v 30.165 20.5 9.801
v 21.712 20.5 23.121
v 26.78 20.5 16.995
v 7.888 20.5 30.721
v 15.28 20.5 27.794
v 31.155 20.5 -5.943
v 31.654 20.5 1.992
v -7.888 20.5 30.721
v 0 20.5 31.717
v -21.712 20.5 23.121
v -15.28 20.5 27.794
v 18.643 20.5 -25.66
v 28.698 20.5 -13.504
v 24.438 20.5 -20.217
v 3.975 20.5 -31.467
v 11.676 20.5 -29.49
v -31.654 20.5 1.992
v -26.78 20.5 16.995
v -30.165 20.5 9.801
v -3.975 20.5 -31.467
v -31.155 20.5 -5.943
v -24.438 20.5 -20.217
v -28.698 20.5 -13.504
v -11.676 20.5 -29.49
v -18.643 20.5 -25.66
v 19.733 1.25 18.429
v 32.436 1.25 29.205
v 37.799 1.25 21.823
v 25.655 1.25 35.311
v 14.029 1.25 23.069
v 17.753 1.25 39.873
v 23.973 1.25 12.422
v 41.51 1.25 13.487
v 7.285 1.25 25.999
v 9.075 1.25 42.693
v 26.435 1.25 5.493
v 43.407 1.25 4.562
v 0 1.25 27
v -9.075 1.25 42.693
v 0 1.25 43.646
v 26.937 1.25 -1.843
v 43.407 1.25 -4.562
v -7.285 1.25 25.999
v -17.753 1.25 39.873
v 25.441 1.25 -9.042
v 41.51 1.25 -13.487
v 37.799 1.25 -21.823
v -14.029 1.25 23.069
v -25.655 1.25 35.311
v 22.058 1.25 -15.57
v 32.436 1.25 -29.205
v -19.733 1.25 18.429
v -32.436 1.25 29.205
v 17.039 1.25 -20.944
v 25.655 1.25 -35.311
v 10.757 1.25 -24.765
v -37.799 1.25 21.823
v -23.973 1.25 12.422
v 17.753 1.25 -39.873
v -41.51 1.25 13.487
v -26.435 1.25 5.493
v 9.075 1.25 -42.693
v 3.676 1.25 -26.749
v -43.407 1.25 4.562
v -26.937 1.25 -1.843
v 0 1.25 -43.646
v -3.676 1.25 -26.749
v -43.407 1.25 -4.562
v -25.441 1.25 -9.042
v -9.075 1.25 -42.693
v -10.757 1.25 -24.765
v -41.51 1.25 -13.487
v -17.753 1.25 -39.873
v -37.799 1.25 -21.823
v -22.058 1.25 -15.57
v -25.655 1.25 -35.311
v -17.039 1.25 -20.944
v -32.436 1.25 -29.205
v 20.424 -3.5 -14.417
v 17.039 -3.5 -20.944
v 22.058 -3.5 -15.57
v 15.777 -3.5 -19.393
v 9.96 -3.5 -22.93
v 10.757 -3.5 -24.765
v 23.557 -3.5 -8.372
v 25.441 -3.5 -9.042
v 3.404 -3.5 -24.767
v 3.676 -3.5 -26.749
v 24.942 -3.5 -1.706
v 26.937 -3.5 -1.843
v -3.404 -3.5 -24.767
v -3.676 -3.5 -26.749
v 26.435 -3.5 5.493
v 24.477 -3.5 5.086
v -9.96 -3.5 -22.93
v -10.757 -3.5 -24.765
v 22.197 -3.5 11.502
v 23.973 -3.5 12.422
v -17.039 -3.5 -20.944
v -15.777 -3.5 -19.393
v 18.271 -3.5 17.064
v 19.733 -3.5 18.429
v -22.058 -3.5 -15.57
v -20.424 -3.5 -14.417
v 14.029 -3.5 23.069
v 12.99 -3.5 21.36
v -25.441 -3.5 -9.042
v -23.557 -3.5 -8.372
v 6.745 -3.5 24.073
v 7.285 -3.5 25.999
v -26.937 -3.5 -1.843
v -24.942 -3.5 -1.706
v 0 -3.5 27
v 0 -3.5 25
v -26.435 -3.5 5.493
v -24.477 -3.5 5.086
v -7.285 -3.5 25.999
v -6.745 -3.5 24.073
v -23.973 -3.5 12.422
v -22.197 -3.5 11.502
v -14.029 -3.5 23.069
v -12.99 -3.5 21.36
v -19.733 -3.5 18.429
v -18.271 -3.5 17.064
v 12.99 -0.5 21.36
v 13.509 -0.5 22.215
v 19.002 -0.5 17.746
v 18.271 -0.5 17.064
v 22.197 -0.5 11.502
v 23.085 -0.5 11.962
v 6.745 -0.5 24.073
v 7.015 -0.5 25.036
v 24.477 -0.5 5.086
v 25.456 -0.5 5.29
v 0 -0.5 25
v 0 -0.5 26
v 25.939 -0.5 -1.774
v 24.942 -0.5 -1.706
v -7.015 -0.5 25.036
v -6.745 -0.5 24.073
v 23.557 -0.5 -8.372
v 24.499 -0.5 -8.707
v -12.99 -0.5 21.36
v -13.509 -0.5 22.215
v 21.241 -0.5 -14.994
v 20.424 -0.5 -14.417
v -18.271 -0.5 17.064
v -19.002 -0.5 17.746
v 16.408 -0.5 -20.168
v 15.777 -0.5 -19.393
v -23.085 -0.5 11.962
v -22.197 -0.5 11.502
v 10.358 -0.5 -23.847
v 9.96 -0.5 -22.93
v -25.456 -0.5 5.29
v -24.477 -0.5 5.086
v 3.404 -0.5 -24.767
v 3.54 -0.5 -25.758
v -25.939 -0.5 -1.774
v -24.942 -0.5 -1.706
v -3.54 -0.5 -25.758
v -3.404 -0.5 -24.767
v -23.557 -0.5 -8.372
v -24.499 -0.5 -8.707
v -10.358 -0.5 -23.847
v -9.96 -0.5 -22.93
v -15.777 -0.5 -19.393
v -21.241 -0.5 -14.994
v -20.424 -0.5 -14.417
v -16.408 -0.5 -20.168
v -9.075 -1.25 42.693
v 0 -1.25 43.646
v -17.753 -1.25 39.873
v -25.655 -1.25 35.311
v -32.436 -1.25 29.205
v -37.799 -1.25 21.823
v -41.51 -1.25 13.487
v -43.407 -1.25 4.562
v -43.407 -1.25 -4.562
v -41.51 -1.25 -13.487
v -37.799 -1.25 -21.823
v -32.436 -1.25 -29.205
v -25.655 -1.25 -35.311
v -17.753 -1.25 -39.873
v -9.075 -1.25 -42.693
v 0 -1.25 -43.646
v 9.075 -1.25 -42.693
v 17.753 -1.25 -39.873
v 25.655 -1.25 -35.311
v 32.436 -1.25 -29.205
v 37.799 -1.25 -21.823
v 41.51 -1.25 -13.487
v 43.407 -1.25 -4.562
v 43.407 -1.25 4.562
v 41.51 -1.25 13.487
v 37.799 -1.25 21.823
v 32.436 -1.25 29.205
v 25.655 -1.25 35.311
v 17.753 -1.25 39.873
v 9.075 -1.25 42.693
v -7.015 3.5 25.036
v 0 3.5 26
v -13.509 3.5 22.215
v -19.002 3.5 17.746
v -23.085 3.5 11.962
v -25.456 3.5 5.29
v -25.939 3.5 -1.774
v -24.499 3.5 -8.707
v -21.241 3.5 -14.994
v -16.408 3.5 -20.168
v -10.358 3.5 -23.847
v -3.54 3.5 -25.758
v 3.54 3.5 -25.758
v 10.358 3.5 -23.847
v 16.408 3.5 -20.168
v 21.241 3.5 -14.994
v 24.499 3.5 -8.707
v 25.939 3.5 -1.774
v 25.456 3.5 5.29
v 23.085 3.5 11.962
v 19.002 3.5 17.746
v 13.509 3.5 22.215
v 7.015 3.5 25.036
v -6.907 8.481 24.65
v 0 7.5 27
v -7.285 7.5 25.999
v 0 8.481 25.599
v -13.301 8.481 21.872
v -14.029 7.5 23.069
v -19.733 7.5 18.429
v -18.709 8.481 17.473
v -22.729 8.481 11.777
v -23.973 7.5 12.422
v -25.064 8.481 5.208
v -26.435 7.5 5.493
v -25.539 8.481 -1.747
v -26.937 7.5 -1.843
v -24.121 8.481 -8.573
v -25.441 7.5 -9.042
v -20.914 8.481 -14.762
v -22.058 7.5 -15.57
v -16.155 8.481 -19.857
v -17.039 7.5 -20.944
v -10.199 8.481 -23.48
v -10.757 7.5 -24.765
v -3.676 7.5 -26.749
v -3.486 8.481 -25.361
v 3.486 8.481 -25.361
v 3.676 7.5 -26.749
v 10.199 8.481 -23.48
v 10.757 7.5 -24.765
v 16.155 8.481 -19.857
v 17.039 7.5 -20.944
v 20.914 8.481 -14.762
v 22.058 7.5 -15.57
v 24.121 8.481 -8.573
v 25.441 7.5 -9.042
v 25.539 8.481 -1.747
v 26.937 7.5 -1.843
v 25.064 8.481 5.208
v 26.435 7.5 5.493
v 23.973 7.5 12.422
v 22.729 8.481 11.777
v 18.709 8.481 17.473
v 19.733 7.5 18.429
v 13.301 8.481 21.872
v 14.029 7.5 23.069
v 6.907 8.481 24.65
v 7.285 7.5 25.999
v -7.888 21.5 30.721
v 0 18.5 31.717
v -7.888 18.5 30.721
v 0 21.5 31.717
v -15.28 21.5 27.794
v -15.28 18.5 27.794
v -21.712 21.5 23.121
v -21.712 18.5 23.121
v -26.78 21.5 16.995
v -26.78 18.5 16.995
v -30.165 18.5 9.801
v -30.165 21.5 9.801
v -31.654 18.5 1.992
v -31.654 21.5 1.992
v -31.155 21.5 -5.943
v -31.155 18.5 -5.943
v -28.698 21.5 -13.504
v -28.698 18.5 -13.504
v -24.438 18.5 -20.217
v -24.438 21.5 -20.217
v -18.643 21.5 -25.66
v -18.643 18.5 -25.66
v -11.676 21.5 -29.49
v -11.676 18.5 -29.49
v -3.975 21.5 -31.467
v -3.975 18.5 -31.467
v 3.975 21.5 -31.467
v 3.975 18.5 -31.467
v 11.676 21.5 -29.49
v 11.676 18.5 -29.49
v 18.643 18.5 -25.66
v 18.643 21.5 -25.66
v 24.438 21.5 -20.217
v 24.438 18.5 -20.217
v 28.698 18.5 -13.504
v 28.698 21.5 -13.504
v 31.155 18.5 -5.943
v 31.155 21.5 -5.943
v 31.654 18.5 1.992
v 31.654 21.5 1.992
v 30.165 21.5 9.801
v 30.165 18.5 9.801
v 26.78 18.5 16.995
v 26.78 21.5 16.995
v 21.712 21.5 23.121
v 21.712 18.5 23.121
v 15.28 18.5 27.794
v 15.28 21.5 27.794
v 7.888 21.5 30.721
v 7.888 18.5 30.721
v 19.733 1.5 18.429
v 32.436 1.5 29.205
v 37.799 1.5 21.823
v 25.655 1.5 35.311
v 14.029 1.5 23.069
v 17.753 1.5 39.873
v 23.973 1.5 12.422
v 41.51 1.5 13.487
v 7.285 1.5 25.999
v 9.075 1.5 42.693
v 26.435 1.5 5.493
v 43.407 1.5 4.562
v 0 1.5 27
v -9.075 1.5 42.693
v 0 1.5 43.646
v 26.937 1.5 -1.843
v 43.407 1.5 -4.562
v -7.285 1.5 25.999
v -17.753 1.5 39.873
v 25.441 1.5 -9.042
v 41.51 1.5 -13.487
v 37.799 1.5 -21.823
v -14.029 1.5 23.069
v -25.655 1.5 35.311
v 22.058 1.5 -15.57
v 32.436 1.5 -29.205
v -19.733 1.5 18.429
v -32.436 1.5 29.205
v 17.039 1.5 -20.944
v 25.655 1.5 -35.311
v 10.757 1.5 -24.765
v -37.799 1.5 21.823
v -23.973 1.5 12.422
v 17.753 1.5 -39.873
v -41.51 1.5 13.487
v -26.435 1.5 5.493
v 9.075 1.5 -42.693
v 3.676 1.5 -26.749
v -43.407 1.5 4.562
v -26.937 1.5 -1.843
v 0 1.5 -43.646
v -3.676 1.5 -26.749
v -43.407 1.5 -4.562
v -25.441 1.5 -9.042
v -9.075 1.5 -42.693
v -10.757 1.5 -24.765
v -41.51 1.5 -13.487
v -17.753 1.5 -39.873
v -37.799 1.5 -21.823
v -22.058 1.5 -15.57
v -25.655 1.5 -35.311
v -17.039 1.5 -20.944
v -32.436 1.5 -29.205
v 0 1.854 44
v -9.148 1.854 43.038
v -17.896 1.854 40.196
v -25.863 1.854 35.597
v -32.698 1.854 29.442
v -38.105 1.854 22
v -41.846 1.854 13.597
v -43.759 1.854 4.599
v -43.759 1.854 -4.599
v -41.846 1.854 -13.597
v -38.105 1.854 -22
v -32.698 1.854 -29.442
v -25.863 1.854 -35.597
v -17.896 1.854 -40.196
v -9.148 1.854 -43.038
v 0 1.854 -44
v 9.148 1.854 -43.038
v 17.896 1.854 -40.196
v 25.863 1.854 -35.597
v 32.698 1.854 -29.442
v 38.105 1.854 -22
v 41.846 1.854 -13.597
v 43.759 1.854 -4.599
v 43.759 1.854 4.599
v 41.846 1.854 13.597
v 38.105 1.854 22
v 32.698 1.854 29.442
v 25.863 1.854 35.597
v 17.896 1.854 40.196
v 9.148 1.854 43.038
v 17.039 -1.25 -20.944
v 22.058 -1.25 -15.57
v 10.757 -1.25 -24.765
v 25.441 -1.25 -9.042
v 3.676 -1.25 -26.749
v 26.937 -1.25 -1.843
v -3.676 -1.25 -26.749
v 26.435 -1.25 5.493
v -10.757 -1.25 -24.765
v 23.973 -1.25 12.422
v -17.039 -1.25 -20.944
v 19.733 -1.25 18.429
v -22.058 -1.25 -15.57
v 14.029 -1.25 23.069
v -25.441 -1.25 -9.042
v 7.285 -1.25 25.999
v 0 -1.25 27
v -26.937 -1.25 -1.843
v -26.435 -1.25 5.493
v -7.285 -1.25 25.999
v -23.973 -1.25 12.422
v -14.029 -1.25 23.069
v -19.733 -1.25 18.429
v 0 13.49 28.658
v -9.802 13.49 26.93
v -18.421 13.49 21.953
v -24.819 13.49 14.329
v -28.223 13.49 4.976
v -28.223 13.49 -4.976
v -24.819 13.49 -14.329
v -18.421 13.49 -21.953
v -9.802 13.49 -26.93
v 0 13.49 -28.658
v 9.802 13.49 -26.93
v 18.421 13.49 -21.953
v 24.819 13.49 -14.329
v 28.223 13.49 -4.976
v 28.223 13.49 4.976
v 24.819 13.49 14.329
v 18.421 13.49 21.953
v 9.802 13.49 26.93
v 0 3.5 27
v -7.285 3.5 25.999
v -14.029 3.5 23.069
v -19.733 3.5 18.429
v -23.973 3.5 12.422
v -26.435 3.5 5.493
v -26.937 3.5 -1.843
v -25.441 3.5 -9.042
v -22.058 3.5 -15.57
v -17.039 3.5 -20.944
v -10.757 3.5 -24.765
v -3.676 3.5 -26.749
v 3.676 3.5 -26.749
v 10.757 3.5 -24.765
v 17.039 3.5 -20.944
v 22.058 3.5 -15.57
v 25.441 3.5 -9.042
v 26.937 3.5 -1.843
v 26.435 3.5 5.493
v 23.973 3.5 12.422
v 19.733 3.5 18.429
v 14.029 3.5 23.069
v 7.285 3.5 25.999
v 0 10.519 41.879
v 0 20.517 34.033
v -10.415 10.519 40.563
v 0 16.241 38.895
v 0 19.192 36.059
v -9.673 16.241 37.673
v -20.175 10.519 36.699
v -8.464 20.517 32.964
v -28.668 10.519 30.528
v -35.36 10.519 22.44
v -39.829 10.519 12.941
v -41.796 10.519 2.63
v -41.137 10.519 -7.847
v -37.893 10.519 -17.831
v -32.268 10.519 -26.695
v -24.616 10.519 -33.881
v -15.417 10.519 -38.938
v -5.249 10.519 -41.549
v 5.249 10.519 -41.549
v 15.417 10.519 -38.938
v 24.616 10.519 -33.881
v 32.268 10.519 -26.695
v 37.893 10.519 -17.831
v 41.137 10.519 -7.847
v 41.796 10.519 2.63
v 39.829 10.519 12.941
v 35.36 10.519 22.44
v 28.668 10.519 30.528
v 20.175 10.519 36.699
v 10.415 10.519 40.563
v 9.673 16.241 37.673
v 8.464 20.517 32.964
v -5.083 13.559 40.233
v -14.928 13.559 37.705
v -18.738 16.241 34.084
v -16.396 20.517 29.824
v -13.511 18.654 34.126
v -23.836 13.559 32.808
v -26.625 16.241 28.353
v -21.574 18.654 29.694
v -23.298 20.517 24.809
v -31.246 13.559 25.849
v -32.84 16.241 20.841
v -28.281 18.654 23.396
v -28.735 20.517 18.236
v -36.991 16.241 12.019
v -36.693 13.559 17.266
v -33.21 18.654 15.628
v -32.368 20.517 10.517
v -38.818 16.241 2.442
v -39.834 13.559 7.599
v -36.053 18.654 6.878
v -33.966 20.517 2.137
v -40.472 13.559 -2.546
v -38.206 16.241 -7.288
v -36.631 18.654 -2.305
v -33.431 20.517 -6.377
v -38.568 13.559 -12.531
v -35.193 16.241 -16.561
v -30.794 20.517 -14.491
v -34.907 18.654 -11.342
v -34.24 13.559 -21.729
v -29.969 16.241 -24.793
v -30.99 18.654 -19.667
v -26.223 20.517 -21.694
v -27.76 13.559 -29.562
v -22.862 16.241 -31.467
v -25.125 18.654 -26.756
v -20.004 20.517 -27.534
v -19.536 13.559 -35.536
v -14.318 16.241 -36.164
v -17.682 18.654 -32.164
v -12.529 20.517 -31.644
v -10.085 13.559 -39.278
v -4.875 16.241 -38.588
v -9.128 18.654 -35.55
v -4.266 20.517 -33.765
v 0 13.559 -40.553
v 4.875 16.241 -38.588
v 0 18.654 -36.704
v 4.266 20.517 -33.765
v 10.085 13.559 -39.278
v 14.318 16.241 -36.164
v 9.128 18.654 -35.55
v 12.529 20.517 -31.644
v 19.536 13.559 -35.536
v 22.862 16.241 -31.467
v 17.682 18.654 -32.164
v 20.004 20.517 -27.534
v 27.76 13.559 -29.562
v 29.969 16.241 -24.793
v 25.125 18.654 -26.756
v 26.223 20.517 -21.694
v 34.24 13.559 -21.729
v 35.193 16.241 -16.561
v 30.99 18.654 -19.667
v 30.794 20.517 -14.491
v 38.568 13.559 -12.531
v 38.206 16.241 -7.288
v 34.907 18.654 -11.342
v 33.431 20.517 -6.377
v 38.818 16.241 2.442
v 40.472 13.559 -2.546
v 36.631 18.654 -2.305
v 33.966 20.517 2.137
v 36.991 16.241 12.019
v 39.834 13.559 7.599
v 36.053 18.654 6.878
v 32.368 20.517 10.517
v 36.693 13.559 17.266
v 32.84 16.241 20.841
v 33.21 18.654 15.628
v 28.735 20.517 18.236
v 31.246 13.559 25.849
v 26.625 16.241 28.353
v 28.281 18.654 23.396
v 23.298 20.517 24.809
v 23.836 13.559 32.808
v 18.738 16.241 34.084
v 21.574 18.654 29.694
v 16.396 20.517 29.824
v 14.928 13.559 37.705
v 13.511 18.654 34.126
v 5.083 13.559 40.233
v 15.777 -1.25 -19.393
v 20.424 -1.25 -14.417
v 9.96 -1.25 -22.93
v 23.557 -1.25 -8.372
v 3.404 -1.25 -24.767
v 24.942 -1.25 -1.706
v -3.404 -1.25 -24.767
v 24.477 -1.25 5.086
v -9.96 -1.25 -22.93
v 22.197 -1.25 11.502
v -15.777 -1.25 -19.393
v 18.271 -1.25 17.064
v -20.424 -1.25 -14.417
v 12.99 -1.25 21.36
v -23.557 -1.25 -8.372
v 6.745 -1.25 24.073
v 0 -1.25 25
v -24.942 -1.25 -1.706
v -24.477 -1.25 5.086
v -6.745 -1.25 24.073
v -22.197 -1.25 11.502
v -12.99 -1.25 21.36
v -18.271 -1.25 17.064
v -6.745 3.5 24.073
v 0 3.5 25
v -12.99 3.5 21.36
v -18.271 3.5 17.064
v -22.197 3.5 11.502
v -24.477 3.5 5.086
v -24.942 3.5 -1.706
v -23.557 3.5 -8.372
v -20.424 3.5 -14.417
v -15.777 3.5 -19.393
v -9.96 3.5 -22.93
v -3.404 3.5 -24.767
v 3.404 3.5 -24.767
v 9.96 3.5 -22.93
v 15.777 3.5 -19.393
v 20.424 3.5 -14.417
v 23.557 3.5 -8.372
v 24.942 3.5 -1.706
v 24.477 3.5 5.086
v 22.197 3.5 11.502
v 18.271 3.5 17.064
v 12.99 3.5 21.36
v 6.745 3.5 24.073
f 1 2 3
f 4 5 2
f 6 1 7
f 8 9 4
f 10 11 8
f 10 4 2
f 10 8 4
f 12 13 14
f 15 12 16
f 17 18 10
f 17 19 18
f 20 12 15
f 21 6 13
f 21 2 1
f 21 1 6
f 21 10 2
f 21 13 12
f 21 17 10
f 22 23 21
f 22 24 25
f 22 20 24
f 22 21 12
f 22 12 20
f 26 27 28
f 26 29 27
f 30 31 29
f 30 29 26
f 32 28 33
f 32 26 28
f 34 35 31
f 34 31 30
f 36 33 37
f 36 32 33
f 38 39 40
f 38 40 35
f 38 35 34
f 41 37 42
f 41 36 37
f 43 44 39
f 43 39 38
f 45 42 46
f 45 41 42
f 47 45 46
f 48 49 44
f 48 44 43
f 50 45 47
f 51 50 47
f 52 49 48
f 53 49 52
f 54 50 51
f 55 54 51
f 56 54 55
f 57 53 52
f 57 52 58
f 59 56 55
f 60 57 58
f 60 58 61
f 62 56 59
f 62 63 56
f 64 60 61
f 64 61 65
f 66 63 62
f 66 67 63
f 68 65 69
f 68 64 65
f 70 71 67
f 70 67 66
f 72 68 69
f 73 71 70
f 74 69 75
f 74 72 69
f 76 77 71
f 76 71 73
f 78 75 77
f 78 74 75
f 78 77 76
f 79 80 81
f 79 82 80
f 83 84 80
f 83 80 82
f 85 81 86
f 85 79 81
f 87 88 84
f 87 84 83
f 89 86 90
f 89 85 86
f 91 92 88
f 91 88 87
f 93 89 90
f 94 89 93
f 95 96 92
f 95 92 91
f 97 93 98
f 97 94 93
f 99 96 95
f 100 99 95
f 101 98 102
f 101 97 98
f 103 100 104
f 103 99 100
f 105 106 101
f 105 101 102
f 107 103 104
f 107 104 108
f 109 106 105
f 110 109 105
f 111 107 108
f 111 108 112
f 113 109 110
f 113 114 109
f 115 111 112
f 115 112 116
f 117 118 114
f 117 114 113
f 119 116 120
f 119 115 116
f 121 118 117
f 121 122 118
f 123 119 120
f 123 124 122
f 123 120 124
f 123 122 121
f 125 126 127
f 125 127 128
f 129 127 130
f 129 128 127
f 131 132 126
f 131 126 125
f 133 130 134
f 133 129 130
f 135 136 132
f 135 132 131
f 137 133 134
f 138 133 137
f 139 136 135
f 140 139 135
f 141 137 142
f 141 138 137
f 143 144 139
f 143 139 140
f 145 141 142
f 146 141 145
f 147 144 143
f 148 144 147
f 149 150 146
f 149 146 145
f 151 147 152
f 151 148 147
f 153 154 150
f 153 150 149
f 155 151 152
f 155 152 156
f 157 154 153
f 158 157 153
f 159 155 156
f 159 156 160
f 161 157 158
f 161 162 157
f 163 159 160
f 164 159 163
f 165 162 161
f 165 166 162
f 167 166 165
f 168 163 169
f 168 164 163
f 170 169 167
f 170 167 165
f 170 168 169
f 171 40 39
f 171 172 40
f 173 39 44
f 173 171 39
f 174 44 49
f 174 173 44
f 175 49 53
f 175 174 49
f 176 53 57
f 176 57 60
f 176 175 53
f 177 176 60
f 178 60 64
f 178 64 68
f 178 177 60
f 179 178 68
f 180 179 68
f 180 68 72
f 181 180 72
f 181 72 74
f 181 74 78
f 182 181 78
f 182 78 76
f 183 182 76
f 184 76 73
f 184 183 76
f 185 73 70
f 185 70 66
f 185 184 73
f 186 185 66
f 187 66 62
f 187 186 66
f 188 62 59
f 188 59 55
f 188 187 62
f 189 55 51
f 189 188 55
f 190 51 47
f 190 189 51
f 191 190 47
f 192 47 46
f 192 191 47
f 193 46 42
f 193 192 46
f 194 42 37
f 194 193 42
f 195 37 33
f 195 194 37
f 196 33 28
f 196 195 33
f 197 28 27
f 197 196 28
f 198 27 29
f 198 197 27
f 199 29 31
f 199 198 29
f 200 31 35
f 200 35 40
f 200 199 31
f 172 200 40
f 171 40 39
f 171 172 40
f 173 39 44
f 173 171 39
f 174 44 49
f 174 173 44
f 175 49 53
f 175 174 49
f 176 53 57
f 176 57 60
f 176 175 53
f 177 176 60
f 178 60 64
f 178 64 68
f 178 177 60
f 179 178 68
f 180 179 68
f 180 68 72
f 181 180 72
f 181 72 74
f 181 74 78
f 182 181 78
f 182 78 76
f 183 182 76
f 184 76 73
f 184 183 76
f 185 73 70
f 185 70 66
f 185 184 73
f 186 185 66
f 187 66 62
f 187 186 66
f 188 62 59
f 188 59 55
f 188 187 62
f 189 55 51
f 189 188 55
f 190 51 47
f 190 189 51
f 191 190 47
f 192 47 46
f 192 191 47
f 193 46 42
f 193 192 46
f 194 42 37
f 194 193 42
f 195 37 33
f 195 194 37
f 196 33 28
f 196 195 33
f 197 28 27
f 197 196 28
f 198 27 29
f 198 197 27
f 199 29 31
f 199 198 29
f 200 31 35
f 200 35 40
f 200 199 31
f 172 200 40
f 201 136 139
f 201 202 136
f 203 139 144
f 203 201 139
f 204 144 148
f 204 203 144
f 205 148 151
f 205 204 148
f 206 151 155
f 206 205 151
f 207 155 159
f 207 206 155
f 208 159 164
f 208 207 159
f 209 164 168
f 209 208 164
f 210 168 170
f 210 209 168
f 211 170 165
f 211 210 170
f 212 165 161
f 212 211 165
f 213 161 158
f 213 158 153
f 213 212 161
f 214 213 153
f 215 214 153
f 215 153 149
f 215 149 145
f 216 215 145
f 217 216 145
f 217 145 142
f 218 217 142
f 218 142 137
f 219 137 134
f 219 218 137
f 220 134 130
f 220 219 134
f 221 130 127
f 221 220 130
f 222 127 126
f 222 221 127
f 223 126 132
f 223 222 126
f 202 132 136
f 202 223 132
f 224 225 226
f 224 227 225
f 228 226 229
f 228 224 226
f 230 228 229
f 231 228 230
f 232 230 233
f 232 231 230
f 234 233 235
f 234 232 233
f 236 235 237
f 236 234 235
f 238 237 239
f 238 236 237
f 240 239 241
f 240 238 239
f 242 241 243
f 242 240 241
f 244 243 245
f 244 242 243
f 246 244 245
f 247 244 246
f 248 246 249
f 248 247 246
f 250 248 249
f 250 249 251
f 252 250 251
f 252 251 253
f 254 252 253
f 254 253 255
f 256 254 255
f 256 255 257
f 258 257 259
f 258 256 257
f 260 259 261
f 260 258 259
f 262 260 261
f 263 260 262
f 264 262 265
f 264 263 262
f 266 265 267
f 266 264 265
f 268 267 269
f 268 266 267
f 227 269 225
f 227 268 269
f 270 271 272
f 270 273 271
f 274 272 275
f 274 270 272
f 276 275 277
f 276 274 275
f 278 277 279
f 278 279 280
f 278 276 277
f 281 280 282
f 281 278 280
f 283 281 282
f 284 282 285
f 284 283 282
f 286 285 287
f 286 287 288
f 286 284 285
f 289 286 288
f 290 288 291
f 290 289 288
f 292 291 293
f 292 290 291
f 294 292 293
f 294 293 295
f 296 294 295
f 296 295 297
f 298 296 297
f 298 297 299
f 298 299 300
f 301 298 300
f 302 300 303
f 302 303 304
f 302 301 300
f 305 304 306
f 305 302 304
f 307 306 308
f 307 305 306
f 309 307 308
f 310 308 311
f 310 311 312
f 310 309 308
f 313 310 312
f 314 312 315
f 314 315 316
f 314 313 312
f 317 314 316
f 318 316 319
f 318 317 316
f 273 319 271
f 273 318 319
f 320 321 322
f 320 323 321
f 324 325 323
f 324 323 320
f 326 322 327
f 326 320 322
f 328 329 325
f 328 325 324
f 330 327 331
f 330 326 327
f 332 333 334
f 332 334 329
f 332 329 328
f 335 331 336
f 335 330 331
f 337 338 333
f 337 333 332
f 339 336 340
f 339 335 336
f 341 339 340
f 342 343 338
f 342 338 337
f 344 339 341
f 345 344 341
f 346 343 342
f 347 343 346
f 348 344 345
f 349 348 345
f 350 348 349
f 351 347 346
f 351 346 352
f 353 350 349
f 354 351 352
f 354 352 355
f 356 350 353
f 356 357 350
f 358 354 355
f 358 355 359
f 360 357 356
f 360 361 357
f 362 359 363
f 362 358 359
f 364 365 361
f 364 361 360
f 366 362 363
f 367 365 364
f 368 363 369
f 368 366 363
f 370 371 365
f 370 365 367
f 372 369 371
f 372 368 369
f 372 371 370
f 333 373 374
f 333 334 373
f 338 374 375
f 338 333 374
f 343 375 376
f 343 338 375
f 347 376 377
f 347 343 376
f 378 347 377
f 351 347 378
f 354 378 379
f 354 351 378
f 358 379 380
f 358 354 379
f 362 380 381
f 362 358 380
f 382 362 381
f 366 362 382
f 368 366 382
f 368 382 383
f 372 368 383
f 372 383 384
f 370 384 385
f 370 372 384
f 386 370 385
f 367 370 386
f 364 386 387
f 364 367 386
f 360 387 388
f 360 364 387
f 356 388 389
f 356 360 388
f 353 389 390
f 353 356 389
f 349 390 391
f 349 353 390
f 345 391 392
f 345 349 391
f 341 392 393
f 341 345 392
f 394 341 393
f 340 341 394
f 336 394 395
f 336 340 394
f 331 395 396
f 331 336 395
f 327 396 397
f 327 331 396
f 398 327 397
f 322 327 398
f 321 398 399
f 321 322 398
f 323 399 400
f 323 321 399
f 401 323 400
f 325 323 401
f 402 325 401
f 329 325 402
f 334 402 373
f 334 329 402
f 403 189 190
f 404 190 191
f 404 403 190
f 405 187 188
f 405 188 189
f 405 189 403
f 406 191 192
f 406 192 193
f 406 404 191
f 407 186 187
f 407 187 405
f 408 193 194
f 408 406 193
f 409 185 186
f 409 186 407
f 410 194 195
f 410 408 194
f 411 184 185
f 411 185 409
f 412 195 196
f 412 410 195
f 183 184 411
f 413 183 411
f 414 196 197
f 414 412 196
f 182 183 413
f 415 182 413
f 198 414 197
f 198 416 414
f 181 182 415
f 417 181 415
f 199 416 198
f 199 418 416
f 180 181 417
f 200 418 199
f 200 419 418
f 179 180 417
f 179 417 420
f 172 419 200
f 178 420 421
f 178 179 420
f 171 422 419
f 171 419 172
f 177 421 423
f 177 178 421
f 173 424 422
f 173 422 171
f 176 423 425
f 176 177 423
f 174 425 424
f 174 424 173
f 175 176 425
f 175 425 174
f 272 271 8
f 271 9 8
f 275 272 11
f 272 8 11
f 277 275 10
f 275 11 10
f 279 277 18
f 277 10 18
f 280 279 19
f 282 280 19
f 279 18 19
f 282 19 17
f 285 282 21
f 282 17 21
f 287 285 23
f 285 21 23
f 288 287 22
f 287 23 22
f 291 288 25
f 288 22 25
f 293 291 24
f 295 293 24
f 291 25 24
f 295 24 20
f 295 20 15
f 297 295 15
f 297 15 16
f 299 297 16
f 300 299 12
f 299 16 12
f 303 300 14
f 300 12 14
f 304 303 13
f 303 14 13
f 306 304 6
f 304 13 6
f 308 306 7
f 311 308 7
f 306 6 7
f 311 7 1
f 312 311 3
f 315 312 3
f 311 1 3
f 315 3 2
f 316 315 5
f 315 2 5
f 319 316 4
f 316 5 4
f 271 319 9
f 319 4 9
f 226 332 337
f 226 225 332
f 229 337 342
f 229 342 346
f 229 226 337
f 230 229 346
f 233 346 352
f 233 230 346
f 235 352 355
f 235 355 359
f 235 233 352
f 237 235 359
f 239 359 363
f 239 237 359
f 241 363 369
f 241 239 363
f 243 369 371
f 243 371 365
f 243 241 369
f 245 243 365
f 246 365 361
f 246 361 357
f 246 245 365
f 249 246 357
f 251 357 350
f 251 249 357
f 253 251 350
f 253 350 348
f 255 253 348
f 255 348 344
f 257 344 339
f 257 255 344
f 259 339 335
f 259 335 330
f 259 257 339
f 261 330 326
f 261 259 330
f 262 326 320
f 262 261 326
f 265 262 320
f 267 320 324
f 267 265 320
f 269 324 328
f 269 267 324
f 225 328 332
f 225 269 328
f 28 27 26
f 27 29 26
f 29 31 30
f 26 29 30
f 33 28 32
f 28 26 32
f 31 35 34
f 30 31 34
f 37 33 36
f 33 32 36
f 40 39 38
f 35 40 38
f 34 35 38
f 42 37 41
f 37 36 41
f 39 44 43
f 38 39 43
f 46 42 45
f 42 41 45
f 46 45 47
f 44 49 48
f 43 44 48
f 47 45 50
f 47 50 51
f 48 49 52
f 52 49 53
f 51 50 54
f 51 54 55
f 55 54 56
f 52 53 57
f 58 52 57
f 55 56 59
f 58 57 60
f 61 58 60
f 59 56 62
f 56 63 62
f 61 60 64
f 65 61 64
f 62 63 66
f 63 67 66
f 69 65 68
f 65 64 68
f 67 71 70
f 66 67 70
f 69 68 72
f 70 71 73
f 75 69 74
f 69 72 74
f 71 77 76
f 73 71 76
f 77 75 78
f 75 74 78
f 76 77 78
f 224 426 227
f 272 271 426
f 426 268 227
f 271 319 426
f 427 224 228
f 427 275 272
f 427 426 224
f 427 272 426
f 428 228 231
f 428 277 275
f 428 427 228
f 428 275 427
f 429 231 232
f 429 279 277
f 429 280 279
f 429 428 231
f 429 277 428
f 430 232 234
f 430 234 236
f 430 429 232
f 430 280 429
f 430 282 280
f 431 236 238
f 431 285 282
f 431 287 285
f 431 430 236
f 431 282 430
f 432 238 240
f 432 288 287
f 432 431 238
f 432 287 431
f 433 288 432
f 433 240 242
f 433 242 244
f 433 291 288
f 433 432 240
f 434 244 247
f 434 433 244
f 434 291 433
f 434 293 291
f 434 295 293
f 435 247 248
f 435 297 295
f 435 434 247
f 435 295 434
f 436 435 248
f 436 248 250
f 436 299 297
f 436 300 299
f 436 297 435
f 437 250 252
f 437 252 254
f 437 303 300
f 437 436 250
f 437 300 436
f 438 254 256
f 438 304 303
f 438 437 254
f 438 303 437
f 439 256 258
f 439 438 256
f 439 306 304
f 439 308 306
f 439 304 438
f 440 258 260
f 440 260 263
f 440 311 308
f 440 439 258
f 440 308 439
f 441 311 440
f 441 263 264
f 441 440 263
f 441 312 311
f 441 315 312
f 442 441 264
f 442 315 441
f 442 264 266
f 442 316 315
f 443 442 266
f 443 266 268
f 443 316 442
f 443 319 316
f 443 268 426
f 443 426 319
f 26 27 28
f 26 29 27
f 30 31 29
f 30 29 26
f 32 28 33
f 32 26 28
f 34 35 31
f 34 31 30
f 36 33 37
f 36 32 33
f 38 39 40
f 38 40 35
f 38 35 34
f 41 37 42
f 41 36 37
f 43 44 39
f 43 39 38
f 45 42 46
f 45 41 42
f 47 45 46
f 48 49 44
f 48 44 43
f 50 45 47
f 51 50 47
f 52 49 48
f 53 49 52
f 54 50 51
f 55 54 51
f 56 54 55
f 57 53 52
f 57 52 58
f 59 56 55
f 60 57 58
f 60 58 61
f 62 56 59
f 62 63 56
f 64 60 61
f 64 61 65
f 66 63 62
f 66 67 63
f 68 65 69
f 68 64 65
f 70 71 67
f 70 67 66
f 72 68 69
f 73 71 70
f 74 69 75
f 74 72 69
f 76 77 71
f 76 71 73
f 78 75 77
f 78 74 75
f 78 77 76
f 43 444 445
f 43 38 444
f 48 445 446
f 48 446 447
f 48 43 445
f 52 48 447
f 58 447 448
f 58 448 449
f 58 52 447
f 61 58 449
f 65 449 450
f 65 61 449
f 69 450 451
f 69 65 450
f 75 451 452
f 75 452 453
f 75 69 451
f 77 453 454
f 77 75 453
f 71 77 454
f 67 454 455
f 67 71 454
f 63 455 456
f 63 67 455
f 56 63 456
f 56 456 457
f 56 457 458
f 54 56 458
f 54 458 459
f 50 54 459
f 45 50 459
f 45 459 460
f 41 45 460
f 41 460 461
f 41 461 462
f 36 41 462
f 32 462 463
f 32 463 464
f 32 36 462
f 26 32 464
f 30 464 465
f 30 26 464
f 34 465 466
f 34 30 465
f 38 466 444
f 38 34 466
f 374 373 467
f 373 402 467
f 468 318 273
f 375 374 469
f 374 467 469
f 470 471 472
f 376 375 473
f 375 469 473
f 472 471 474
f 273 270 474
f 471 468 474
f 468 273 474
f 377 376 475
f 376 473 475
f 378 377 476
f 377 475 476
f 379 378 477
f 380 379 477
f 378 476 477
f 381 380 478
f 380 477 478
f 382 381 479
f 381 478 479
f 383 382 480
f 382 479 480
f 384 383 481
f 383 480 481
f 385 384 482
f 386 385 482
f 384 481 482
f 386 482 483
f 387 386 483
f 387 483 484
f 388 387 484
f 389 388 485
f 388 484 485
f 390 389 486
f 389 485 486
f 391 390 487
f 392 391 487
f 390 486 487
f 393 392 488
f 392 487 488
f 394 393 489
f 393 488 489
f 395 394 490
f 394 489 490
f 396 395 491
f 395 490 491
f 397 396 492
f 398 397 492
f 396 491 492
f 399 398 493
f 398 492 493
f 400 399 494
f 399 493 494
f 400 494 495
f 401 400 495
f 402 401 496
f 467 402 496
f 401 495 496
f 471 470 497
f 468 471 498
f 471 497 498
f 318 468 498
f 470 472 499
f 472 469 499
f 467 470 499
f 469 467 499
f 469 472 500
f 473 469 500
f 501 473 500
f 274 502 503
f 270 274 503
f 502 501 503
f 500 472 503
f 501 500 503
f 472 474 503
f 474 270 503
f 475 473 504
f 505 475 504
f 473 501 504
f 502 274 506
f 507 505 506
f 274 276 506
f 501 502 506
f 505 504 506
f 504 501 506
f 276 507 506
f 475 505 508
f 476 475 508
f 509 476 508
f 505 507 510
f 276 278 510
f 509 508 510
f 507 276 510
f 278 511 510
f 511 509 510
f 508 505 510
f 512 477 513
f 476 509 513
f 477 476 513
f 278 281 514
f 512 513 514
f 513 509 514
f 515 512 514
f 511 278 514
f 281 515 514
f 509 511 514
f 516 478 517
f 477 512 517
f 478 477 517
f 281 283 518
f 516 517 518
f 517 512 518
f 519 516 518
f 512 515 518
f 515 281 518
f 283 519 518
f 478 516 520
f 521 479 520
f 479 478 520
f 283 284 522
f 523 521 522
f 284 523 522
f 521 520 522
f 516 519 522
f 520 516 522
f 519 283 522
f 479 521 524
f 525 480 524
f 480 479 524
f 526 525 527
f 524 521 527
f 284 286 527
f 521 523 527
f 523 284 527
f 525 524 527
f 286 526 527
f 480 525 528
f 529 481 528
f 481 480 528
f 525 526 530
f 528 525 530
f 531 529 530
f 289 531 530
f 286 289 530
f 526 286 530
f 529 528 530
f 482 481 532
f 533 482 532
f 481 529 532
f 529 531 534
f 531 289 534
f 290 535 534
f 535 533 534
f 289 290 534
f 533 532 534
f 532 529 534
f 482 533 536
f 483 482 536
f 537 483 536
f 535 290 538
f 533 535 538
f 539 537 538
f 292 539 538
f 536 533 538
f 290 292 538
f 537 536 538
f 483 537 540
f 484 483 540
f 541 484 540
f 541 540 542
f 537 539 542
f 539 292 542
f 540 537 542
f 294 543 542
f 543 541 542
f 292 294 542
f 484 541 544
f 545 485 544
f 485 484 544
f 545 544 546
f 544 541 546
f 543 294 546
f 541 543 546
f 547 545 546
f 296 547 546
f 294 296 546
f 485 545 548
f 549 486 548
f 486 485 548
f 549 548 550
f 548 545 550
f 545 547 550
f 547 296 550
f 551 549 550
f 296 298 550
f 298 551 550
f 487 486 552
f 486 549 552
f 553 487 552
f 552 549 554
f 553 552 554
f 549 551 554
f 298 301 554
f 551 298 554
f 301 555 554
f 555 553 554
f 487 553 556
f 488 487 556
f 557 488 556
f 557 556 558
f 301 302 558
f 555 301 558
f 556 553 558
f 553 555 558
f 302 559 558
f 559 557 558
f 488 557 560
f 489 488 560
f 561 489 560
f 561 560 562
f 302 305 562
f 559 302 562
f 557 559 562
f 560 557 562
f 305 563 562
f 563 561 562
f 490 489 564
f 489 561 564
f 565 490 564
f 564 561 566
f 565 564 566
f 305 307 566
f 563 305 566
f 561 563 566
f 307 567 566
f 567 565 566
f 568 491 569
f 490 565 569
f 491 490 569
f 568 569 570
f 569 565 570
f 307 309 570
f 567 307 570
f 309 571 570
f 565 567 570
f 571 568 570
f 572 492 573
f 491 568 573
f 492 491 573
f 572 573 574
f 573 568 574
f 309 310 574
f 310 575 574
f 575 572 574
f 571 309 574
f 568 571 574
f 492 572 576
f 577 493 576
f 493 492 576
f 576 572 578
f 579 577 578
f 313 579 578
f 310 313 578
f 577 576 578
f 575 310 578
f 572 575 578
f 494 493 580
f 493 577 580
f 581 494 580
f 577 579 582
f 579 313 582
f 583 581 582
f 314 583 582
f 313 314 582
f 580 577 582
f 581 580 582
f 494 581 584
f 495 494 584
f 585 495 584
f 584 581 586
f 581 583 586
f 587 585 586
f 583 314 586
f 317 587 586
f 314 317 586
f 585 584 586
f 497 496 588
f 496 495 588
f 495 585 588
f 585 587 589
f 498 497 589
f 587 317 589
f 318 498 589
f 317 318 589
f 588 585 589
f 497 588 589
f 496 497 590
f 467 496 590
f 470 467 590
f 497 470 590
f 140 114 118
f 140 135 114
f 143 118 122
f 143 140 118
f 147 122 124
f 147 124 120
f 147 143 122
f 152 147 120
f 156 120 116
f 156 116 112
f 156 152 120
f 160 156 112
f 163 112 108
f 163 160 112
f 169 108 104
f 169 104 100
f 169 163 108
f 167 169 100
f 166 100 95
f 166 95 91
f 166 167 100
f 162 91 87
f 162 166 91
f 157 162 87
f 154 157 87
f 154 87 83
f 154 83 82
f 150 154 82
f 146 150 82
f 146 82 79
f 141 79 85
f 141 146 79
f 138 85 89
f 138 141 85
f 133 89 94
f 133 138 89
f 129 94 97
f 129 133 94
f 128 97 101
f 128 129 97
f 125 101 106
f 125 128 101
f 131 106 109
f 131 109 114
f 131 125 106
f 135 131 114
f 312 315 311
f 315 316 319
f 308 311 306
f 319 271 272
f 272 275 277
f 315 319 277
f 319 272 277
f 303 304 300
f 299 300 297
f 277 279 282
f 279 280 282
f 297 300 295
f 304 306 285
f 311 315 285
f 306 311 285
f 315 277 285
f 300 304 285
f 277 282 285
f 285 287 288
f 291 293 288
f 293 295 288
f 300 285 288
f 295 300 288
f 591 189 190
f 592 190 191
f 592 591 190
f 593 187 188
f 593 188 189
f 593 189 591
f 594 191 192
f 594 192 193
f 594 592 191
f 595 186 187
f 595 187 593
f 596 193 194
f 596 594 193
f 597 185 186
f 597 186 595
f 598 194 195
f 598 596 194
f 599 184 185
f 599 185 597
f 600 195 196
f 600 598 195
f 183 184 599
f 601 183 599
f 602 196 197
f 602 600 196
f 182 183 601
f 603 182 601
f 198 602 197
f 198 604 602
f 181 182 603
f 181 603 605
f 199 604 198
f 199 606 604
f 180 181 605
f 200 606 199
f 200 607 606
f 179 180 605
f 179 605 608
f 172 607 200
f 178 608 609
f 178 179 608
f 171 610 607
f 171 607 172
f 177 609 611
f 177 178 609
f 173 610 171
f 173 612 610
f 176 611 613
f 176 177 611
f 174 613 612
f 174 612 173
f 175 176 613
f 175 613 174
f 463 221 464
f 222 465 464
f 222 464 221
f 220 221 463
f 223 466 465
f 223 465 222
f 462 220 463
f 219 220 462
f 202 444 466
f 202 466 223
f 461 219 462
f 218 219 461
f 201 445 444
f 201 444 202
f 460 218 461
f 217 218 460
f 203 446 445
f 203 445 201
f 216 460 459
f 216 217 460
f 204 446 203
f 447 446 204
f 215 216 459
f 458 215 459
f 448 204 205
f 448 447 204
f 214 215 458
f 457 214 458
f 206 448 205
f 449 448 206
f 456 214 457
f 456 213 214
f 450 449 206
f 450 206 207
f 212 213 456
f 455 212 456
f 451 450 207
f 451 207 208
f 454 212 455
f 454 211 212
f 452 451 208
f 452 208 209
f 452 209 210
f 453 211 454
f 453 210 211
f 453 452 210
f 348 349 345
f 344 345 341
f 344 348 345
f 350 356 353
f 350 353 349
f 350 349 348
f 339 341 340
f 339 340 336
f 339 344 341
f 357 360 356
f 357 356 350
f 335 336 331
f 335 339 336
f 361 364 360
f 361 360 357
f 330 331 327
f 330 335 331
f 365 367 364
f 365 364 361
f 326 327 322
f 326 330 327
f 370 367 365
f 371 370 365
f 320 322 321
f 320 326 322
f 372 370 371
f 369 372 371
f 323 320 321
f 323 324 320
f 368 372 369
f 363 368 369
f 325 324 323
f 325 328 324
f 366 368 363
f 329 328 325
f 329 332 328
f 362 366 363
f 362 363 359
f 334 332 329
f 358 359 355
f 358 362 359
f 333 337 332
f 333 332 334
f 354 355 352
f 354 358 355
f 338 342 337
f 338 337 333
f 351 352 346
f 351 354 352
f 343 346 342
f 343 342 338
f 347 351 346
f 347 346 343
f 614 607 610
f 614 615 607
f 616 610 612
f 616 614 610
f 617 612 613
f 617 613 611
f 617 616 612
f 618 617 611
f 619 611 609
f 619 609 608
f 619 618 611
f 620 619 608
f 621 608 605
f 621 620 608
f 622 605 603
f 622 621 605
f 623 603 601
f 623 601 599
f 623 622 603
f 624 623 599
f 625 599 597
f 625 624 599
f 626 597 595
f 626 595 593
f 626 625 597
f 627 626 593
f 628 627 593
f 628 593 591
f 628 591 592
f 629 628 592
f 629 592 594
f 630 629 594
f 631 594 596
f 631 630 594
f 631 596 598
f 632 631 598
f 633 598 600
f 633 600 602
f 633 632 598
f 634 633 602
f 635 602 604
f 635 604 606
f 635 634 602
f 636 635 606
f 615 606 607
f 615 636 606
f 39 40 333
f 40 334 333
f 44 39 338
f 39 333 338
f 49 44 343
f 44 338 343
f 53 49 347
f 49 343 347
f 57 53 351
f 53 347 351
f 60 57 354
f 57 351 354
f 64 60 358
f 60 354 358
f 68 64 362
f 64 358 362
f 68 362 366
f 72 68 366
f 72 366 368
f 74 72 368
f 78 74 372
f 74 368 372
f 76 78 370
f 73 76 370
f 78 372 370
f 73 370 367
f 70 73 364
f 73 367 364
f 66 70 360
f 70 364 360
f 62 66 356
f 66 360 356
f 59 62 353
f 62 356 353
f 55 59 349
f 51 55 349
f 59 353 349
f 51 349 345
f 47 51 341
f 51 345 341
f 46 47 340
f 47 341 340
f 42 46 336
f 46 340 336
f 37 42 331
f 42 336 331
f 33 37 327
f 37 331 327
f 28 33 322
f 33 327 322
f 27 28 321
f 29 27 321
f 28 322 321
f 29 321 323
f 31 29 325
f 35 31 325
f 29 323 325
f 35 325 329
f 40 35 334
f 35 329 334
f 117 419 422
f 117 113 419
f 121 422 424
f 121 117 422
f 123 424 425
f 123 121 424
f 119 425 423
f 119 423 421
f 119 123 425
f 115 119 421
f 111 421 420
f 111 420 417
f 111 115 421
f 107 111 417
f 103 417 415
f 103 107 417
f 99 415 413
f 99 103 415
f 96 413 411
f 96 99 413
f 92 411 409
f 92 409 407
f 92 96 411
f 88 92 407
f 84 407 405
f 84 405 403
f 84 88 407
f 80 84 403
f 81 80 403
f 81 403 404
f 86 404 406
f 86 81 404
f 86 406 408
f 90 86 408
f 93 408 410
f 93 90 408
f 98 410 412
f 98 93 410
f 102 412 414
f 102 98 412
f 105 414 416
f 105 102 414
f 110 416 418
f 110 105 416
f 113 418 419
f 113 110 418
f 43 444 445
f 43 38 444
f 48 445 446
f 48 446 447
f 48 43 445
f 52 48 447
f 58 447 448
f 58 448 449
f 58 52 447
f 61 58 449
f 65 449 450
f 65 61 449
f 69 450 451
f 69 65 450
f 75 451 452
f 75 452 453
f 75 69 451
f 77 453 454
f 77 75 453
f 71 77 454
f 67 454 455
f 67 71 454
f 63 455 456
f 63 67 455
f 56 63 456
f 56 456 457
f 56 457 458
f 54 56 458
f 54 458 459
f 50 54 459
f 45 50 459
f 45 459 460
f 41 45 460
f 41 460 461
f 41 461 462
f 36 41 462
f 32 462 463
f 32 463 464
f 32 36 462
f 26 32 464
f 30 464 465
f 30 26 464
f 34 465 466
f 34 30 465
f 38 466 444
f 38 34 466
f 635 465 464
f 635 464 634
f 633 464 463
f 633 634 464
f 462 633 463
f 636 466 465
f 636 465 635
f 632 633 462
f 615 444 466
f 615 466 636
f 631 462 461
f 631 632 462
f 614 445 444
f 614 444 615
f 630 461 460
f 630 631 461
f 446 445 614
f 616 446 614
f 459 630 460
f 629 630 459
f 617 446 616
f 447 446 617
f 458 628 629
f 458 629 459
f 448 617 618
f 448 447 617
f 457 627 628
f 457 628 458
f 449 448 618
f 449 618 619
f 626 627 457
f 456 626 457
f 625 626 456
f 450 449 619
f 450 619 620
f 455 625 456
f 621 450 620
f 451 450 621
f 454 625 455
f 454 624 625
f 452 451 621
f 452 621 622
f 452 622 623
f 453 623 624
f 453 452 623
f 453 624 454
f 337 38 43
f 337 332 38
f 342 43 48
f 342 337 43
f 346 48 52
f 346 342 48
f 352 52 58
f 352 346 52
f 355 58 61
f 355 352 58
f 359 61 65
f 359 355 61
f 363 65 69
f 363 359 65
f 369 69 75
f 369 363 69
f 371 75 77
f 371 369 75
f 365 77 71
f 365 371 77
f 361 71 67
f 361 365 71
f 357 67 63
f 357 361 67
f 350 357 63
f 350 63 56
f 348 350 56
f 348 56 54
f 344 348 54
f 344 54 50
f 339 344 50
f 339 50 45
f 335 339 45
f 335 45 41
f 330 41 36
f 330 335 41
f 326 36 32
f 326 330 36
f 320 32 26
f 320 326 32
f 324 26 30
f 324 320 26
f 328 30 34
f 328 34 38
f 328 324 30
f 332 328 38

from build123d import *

# Parameters (mm, degrees)
F1_W   = 2
F1_H   = 31.7170210183
F1_W_2 = 0.25
F1_H_2 = 16.6464466094


with BuildPart() as f3:
    # F1 (on Right) → F3 (revolve)
    with BuildSketch(Plane.YZ):
        Polygon((1.25, 27), (1.25, 43.6464466094), (-1.25, 43.6464466094), (-1.25, 27), (-3.5, 27), (-3.5, 25), (-0.5, 25), (-0.5, 26), (3.5, 26), (3.5, 27), (1.5, 27), align=None)
    revolve(axis=Axis((0, -5.4868920706, 0), (0, -1, 0)))


with BuildPart() as f4:
    # F1 (on Right) → F4 (revolve)
    with BuildSketch(Plane.YZ):
        with Locations((19.5, 15.8585105091)):
            Rectangle(F1_W, F1_H)
    revolve(axis=Axis((0, -5.4868920706, 0), (0, -1, 0)))


with BuildPart() as f4b:
    # F1 (on Right) → F4, piece 2 (revolve)
    with BuildSketch(Plane.YZ):
        with Locations((1.375, 35.3232233047)):
            Rectangle(F1_W_2, F1_H_2)
    revolve(axis=Axis((0, -5.4868920706, 0), (0, -1, 0)))


with BuildPart() as f5:
    # F1 (on Right) → F5 (revolve)
    with BuildSketch(Plane.YZ):
        with BuildLine():
            Line((1.8535533906, 44), (1.5, 43.6464466094))
            Line((1.5, 43.6464466094), (1.5, 27))
            Line((1.5, 27), (3.5, 27))
            Line((3.5, 27), (7.5, 27))
            Line((7.5, 27), (8.4809757984, 25.5990213688))
            Line((8.4809757984, 25.5990213688), (18.5, 31.7170210183))
            Line((18.5, 31.7170210183), (20.5, 31.7170210183))
            Line((20.5, 31.7170210183), (21.5, 31.7170210183))
            add(Edge.make_bspline(
                [(1.8535533906, 44), (11.1389525673, 42.5550513347), (19.0029591322, 39.3925085664), (21.5, 31.7170210183)],
                knots=[0, 0, 0, 0, 1, 1, 1, 1], degree=3))
        make_face()
    revolve(axis=Axis((0, -5.4868920706, 0), (0, -1, 0)))


with BuildPart() as f6:
    # F2 (on Right) → F6 (revolve)
    with BuildSketch(Plane.YZ):
        Polygon((1.25, 43.6464466094), (-1.25, 43.6464466094), (-1.25, 25), (3.5, 25), (3.5, 27), (1.25, 27), align=None)
    revolve(axis=Axis((0, -5.4868920706, 0), (0, -1, 0)))


solid = Compound([f3.part, f4.part, f4b.part, f5.part, f6.part])
